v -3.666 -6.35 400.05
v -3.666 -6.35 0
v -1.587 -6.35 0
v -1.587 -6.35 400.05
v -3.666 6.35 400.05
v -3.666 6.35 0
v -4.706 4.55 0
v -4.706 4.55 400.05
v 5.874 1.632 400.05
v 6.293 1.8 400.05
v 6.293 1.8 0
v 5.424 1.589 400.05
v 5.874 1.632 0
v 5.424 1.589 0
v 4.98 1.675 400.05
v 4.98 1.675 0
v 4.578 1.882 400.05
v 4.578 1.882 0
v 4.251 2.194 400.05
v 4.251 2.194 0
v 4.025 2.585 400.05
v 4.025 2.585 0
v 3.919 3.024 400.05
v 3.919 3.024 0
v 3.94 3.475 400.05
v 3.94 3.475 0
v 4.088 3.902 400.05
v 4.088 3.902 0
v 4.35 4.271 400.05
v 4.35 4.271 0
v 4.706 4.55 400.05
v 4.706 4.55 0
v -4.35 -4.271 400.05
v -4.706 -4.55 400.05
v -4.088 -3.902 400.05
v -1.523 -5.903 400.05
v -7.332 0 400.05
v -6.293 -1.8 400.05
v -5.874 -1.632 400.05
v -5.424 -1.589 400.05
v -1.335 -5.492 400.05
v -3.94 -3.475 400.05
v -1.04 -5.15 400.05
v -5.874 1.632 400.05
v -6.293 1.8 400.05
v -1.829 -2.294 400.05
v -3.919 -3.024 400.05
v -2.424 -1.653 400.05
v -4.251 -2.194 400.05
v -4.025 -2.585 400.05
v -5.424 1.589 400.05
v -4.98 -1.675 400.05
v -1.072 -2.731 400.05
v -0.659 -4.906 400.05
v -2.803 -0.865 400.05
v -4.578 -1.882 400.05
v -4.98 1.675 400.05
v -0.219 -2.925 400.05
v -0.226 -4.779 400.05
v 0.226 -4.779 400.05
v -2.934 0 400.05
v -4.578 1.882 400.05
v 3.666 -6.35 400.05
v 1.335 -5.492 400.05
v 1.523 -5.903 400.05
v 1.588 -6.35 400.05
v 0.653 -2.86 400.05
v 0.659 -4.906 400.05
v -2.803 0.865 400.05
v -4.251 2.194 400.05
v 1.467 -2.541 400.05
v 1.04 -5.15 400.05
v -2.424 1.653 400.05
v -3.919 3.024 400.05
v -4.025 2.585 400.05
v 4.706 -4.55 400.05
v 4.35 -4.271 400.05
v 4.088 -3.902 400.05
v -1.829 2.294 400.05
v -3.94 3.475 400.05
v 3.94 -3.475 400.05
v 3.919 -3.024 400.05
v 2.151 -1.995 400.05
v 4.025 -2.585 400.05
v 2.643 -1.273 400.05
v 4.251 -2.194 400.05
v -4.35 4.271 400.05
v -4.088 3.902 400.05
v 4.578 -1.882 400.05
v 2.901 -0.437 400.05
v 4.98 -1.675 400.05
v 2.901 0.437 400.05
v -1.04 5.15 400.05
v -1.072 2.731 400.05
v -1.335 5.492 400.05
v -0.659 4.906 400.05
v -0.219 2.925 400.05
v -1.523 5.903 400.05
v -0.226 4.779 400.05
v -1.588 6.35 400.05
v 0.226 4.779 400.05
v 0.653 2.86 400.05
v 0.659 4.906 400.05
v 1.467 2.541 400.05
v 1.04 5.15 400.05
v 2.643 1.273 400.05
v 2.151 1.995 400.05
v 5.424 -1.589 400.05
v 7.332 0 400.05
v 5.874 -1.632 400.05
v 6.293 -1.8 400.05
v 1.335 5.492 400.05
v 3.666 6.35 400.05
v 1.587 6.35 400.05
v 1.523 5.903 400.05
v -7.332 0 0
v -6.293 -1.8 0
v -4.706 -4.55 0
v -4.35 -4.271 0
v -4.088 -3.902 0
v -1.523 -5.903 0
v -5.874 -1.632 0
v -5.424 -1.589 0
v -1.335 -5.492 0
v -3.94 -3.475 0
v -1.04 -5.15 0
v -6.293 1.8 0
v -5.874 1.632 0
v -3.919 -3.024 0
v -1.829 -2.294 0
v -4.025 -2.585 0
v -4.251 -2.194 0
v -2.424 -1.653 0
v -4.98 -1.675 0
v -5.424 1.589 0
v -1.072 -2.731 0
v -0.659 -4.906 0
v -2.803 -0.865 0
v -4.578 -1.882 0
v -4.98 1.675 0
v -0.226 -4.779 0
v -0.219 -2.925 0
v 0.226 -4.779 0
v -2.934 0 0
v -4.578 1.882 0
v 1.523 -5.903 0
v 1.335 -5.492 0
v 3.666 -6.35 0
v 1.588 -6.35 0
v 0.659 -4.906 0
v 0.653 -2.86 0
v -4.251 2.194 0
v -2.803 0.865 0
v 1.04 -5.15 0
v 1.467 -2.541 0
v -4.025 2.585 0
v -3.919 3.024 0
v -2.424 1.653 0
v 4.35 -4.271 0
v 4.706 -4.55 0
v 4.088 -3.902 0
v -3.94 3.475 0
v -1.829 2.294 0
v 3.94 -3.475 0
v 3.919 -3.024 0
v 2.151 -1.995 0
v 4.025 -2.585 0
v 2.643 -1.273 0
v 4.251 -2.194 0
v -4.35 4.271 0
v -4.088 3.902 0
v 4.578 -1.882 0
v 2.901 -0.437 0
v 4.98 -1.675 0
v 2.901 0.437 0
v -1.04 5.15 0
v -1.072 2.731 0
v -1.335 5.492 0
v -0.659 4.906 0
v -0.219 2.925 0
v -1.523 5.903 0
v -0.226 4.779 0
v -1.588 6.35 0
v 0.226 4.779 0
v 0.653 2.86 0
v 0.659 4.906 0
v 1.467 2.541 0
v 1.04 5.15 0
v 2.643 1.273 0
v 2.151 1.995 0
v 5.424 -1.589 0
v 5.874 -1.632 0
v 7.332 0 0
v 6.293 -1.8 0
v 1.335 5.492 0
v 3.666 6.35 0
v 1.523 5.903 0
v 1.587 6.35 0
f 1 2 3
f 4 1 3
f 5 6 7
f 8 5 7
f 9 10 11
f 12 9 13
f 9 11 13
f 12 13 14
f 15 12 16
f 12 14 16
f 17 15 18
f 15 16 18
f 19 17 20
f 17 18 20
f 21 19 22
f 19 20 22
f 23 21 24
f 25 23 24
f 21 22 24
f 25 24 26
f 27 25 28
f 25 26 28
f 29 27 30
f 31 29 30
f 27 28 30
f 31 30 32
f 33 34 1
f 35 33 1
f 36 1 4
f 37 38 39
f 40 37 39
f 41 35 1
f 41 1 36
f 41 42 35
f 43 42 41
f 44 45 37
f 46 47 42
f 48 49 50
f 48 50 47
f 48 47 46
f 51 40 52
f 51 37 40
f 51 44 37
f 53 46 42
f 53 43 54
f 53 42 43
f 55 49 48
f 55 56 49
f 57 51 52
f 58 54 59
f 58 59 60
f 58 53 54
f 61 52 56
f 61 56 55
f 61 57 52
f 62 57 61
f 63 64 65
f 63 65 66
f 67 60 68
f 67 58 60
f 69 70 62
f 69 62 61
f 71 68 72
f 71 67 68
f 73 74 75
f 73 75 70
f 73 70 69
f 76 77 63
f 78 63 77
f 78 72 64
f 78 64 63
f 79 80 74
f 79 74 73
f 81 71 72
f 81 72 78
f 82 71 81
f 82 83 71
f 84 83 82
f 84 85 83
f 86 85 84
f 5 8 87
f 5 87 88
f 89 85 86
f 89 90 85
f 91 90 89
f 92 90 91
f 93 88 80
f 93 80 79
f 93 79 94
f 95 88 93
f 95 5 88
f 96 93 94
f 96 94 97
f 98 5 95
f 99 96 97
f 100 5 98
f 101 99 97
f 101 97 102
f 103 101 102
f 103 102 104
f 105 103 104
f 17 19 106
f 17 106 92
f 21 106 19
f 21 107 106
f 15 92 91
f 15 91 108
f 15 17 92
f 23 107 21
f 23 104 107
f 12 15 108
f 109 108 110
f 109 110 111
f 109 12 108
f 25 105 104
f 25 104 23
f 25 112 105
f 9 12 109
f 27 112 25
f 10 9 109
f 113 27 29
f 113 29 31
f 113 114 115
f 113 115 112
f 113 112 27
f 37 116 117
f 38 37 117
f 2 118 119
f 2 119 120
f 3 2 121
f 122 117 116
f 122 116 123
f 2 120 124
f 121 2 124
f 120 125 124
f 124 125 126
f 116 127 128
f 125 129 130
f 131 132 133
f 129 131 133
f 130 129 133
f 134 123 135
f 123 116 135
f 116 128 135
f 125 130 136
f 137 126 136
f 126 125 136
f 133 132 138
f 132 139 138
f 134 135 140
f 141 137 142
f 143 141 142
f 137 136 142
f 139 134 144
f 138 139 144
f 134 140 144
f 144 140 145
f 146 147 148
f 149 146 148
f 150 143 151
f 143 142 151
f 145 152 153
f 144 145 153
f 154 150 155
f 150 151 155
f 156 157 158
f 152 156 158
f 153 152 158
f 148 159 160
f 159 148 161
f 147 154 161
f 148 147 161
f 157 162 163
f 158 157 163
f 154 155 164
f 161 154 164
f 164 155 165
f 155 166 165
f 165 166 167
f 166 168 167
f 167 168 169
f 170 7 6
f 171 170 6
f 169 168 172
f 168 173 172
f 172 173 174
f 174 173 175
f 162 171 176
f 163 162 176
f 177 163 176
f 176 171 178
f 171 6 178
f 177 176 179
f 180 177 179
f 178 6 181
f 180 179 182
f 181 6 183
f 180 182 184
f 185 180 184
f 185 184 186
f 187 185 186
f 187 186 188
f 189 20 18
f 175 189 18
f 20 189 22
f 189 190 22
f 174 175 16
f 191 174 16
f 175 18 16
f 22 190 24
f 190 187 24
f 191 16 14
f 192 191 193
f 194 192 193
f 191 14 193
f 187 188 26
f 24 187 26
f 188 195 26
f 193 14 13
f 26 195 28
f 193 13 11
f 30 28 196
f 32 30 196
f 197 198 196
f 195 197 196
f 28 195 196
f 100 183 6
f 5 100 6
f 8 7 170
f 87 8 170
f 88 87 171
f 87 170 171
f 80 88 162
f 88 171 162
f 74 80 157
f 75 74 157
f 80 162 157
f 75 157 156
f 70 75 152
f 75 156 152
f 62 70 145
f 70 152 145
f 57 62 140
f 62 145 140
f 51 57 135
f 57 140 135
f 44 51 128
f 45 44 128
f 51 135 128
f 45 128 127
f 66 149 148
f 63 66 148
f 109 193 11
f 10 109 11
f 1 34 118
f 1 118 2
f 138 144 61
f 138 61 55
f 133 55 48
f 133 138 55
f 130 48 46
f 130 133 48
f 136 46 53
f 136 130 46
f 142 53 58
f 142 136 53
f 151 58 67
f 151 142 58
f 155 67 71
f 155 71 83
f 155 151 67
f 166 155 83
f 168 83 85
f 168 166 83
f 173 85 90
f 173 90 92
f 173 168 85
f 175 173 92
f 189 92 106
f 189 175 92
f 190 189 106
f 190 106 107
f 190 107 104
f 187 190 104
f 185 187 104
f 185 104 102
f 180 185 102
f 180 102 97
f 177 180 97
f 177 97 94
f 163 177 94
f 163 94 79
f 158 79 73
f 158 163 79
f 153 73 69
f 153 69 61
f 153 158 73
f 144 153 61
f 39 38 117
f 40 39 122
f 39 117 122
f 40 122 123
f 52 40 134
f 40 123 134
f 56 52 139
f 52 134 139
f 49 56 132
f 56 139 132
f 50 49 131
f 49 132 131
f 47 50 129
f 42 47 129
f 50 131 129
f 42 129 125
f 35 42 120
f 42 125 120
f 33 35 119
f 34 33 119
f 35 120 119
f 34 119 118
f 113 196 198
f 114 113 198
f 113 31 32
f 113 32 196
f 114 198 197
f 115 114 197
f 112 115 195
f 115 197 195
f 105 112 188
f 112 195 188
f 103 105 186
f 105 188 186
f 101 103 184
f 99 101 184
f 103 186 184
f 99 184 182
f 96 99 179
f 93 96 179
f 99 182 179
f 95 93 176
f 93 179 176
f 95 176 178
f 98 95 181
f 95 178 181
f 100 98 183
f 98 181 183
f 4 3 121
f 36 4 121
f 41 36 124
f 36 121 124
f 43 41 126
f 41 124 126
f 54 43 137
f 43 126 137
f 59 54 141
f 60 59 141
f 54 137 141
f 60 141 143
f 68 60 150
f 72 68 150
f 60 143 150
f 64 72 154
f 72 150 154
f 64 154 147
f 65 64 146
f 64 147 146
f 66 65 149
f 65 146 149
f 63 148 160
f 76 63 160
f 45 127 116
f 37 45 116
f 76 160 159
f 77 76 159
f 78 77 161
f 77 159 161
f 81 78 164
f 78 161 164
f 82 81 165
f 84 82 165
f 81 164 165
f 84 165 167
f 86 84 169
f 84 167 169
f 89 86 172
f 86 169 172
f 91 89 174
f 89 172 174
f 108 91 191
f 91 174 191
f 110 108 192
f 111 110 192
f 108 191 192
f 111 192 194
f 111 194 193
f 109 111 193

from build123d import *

# Parameters (mm, degrees)
SKETCH1_R           = 2.9337
BOSS_EXTRUDE1_DEPTH = 400.05


with BuildPart() as part:
    # Sketch1 → Boss-Extrude1 (new body)
    with BuildSketch(Plane.XY):
        with BuildLine():
            Line((-1.587500385, 6.349999904), (-3.666174594, 6.349999778))
            Line((-3.666174594, 6.349999778), (-4.70551159, 4.549815043))
            ThreePointArc((-4.70551159, 4.549815043), (-4.12444613, 2.38124975), (-6.293011423, 1.80018429))
            Line((-6.293011423, 1.80018429), (-7.332348419, -4.44e-07))
            Line((-7.332348419, -4.44e-07), (-6.293011205, -1.800185053))
            ThreePointArc((-6.293011205, -1.800185053), (-4.124445841, -2.38125025), (-4.705511038, -4.549815614))
            Line((-4.705511038, -4.549815614), (-3.666173825, -6.350000222))
            Line((-3.666173825, -6.350000222), (-1.587499615, -6.350000096))
            ThreePointArc((-1.587499615, -6.350000096), (2.89e-07, -4.7625), (1.587500385, -6.349999904))
            Line((1.587500385, -6.349999904), (3.666174594, -6.349999778))
            Line((3.666174594, -6.349999778), (4.70551159, -4.549815043))
            ThreePointArc((4.70551159, -4.549815043), (4.12444613, -2.38124975), (6.293011423, -1.80018429))
            Line((6.293011423, -1.80018429), (7.332348419, 4.44e-07))
            Line((7.332348419, 4.44e-07), (6.293011205, 1.800185053))
            ThreePointArc((6.293011205, 1.800185053), (4.124445841, 2.38125025), (4.705511038, 4.549815614))
            Line((4.705511038, 4.549815614), (3.666173825, 6.350000222))
            Line((3.666173825, 6.350000222), (1.587499615, 6.350000096))
            ThreePointArc((1.587499615, 6.350000096), (-2.89e-07, 4.7625), (-1.587500385, 6.349999904))
        make_face()
        with Locations(Location((0, 0, 0), (0, 0, 180))):
            Circle(SKETCH1_R, mode=Mode.SUBTRACT)
    extrude(amount=BOSS_EXTRUDE1_DEPTH)


solid = part.part
